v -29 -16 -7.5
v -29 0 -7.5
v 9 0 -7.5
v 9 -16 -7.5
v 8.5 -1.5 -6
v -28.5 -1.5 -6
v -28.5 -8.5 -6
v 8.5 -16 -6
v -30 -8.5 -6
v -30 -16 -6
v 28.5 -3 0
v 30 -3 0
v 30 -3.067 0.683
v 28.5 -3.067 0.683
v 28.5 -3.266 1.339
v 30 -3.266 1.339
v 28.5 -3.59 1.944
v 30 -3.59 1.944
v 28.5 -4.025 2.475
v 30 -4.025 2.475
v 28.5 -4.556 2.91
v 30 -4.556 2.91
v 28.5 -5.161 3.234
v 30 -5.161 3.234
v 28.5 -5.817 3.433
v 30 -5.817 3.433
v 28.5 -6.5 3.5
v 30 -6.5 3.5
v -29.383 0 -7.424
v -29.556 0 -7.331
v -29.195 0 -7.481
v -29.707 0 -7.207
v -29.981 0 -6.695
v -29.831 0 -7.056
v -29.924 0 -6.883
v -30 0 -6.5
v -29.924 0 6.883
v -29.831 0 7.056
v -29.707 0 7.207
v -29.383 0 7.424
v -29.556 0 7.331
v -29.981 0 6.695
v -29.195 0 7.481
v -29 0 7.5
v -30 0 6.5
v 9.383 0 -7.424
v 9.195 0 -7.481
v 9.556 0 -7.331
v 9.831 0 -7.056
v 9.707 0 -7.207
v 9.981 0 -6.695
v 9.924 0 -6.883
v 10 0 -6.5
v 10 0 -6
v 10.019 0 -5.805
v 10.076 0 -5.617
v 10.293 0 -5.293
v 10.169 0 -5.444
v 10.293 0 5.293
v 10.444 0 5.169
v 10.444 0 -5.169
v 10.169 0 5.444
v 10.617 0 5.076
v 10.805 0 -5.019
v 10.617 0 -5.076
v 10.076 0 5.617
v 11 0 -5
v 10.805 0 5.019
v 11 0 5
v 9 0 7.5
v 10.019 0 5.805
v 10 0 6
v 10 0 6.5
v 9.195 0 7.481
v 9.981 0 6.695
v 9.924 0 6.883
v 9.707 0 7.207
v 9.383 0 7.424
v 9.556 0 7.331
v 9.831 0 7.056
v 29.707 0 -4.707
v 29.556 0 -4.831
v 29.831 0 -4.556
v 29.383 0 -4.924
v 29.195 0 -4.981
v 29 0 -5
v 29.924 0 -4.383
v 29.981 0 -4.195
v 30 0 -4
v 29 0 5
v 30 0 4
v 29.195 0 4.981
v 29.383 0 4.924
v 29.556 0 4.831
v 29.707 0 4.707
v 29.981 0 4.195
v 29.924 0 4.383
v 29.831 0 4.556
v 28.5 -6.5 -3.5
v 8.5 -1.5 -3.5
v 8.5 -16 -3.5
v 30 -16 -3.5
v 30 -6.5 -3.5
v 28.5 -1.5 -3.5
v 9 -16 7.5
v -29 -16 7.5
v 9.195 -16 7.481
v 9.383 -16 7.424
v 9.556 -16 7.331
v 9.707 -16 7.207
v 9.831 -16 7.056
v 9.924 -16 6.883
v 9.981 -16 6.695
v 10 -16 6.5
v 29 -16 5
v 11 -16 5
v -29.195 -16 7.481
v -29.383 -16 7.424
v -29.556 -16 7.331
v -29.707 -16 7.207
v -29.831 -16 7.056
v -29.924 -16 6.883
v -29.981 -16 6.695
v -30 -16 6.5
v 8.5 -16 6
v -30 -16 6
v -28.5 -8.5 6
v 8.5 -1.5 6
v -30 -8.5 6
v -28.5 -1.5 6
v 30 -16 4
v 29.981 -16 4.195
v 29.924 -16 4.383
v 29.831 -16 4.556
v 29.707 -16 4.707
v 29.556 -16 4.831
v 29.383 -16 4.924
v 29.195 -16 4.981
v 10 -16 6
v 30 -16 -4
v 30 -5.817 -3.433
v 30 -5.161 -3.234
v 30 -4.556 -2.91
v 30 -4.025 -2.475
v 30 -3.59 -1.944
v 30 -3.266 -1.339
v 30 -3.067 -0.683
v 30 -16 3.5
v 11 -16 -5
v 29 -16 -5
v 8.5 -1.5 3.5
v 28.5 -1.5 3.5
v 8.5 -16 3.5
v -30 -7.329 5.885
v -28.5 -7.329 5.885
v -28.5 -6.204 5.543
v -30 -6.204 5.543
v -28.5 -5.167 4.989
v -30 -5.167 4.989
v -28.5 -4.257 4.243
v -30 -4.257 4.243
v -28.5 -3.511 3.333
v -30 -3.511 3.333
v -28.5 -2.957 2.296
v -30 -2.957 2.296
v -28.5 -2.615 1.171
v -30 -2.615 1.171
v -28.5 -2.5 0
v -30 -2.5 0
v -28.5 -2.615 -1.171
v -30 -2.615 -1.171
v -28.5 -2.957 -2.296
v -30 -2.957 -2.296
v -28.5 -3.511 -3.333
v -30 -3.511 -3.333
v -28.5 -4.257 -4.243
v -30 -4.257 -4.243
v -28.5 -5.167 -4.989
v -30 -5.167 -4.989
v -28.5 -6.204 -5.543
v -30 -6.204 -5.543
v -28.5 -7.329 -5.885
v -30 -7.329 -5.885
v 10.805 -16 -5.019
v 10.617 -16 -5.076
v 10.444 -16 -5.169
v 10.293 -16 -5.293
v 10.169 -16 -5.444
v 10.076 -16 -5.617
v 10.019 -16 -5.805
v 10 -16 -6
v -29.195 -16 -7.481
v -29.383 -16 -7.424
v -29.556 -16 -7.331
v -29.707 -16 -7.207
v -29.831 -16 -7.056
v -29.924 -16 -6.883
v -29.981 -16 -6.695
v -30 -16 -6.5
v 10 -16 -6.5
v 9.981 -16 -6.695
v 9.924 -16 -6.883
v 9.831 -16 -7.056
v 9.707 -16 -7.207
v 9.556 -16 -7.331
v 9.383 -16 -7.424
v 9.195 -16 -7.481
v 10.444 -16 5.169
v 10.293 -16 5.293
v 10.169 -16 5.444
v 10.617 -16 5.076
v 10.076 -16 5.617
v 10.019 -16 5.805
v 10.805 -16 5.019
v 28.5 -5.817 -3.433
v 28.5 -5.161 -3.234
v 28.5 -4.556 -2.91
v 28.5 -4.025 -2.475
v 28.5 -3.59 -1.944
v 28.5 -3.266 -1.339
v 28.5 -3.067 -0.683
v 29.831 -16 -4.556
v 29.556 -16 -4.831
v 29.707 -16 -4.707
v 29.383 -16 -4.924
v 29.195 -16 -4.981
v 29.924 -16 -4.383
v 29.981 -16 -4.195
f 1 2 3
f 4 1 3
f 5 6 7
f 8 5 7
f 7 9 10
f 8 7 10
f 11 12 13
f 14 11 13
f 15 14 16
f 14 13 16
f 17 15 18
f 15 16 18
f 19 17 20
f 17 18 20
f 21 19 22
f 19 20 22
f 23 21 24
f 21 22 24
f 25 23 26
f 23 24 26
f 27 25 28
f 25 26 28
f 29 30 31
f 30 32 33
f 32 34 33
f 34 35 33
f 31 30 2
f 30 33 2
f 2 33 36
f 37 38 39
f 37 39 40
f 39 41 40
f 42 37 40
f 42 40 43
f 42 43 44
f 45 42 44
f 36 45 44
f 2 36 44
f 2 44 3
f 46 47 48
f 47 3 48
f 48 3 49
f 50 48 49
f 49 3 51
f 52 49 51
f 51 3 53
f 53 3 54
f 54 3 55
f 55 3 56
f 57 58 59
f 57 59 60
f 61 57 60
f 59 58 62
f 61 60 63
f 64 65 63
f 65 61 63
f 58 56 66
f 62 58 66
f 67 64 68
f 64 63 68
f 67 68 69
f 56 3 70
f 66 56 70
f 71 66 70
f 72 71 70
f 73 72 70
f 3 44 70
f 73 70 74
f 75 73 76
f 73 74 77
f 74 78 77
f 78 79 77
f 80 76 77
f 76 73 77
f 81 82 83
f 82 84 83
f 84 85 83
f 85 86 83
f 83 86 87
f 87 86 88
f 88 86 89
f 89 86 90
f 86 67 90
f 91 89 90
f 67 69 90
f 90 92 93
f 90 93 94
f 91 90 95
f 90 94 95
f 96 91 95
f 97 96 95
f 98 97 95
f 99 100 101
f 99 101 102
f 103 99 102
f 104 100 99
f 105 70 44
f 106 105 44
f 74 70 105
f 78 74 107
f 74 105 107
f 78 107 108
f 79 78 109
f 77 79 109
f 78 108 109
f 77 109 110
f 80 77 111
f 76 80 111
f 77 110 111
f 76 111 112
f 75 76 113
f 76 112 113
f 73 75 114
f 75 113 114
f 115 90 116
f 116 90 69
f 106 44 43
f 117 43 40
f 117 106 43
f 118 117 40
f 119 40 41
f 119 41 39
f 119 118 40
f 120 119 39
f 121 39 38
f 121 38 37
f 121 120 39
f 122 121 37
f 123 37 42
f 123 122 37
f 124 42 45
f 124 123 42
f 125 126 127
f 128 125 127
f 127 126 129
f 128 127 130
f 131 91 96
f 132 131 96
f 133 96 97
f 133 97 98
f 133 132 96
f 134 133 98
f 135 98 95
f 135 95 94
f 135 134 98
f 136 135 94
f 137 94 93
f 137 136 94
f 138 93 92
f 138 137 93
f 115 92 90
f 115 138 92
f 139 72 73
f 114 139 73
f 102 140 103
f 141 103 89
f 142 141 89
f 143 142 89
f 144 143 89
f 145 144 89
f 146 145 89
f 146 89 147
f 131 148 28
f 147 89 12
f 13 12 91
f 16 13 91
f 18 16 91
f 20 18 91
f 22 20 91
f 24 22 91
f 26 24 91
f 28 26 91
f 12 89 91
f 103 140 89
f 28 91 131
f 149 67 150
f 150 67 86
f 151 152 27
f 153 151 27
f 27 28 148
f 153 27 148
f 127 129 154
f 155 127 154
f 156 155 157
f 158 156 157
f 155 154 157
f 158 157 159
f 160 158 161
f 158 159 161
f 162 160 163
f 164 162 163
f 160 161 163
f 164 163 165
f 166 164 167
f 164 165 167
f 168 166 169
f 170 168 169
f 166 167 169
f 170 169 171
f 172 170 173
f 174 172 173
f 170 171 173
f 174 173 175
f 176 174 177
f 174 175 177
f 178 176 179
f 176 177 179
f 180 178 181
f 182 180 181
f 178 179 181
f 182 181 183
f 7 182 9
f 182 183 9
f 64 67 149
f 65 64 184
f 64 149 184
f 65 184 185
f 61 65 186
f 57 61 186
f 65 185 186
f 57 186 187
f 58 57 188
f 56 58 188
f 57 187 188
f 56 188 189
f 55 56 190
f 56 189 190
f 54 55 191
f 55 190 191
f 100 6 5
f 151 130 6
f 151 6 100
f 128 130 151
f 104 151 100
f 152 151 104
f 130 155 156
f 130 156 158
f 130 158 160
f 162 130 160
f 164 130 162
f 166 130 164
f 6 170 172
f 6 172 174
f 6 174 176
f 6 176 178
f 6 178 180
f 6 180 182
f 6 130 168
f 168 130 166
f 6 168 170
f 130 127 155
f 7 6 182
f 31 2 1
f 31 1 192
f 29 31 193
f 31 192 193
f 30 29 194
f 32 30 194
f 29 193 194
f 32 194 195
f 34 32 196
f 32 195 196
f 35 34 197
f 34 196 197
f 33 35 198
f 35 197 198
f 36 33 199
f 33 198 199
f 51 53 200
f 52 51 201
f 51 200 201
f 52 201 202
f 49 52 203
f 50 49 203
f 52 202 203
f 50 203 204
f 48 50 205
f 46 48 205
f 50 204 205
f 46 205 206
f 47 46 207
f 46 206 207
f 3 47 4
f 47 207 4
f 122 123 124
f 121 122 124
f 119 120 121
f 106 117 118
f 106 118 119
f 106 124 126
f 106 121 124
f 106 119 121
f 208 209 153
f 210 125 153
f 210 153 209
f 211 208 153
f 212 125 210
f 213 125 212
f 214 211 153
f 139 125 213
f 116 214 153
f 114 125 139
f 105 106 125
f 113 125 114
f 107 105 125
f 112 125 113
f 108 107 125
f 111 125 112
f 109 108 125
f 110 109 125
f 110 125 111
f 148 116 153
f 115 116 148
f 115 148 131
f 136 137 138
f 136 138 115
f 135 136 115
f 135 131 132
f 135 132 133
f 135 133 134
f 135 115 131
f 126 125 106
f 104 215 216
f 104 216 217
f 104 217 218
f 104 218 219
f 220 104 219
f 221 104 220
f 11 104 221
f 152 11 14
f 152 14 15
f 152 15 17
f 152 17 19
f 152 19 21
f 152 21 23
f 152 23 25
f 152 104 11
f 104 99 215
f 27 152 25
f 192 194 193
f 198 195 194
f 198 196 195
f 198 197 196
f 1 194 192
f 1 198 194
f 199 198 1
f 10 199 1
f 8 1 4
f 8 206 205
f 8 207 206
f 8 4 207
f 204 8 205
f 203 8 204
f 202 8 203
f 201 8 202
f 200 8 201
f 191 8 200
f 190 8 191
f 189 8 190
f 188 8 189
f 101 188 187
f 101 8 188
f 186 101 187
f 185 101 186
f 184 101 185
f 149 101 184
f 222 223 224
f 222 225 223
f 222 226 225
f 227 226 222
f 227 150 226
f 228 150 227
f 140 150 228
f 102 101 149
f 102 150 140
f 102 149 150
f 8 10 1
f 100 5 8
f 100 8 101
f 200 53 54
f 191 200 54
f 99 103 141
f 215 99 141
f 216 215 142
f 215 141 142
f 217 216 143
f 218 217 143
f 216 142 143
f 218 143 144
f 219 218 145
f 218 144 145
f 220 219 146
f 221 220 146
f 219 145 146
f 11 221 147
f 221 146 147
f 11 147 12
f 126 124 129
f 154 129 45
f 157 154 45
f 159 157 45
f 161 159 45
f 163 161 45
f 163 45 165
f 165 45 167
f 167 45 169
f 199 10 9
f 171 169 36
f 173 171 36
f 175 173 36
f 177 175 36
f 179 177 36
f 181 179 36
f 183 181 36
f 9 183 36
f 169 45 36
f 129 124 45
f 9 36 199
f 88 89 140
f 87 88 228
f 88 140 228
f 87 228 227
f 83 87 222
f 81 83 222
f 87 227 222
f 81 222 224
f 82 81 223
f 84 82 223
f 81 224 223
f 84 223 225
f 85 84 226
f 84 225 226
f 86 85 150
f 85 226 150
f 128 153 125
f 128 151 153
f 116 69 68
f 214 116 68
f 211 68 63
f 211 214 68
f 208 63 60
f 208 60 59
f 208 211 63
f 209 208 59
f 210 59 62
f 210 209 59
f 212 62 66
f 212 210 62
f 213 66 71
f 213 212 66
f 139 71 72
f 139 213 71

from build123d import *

# Parameters (mm, degrees)
F1_DEPTH = 16
F2_T     = -1.5
F4_DEPTH = 25
F6_DEPTH = 25
F7_R     = 1


with BuildPart() as f1:
    # F0 (on Front) → F1 (new body)
    with BuildSketch(Plane.XZ):
        Polygon((10, 7.5), (-30, 7.5), (-30, -7.5), (10, -7.5), (10, -5), (30, -5), (30, 5), (10, 5), align=None)
    extrude(amount=F1_DEPTH)

    # F2
    f2_openings = [f1.faces().sort_by_distance(p)[0] for p in [
        (-2.5, -16, 0),
    ]]
    offset(amount=F2_T, openings=f2_openings, kind=Kind.INTERSECTION)

    # F3 (on face) → F4 (cut)
    with BuildSketch(Plane.YZ.offset(30)):
        with BuildLine():
            ThreePointArc((-6.5, -3.5), (-10, 0), (-6.5, 3.5))
            Line((-6.5, 3.5), (-16, 3.5))
            Line((-16, 3.5), (-16, -3.5))
            Line((-16, -3.5), (-6.5, -3.5))
        make_face()
        with BuildLine():
            ThreePointArc((-6.5, -3.5), (-4.0251262658, -2.4748737342), (-3, 0))
            ThreePointArc((-3, 0), (-4.0251262658, 2.4748737342), (-6.5, 3.5))
            ThreePointArc((-6.5, 3.5), (-10, 0), (-6.5, -3.5))
        make_face()
    extrude(amount=-F4_DEPTH, mode=Mode.SUBTRACT)

    # F5 (on face) → F6 (cut)
    with BuildSketch(Plane(origin=(-30, 0, 0), x_dir=(0, -1, 0), z_dir=(-1, 0, 0))):
        with BuildLine():
            ThreePointArc((8.5, -6), (12.7426406871, -4.2426406871), (14.5, 0))
            ThreePointArc((14.5, 0), (12.7426406871, 4.2426406871), (8.5, 6))
            ThreePointArc((8.5, 6), (2.5, 0), (8.5, -6))
        make_face()
        with BuildLine():
            ThreePointArc((8.5, 6), (12.7426406871, 4.2426406871), (14.5, 0))
            ThreePointArc((14.5, 0), (12.7426406871, -4.2426406871), (8.5, -6))
            Line((8.5, -6), (16, -6))
            Line((16, -6), (16, 6))
            Line((16, 6), (8.5, 6))
        make_face()
    extrude(amount=-F6_DEPTH, mode=Mode.SUBTRACT)

    # F7
    f7_edges = [f1.edges().sort_by_distance(p)[0] for p in [
        (-30, -8, -7.5),
        (-30, -8, 7.5),
        (10, -8, 5),
        (10, -8, 7.5),
        (10, -8, -7.5),
        (10, -8, -5),
        (30, -8, -5),
        (30, -8, 5),
    ]]
    fillet(f7_edges, radius=F7_R)


solid = f1.part
